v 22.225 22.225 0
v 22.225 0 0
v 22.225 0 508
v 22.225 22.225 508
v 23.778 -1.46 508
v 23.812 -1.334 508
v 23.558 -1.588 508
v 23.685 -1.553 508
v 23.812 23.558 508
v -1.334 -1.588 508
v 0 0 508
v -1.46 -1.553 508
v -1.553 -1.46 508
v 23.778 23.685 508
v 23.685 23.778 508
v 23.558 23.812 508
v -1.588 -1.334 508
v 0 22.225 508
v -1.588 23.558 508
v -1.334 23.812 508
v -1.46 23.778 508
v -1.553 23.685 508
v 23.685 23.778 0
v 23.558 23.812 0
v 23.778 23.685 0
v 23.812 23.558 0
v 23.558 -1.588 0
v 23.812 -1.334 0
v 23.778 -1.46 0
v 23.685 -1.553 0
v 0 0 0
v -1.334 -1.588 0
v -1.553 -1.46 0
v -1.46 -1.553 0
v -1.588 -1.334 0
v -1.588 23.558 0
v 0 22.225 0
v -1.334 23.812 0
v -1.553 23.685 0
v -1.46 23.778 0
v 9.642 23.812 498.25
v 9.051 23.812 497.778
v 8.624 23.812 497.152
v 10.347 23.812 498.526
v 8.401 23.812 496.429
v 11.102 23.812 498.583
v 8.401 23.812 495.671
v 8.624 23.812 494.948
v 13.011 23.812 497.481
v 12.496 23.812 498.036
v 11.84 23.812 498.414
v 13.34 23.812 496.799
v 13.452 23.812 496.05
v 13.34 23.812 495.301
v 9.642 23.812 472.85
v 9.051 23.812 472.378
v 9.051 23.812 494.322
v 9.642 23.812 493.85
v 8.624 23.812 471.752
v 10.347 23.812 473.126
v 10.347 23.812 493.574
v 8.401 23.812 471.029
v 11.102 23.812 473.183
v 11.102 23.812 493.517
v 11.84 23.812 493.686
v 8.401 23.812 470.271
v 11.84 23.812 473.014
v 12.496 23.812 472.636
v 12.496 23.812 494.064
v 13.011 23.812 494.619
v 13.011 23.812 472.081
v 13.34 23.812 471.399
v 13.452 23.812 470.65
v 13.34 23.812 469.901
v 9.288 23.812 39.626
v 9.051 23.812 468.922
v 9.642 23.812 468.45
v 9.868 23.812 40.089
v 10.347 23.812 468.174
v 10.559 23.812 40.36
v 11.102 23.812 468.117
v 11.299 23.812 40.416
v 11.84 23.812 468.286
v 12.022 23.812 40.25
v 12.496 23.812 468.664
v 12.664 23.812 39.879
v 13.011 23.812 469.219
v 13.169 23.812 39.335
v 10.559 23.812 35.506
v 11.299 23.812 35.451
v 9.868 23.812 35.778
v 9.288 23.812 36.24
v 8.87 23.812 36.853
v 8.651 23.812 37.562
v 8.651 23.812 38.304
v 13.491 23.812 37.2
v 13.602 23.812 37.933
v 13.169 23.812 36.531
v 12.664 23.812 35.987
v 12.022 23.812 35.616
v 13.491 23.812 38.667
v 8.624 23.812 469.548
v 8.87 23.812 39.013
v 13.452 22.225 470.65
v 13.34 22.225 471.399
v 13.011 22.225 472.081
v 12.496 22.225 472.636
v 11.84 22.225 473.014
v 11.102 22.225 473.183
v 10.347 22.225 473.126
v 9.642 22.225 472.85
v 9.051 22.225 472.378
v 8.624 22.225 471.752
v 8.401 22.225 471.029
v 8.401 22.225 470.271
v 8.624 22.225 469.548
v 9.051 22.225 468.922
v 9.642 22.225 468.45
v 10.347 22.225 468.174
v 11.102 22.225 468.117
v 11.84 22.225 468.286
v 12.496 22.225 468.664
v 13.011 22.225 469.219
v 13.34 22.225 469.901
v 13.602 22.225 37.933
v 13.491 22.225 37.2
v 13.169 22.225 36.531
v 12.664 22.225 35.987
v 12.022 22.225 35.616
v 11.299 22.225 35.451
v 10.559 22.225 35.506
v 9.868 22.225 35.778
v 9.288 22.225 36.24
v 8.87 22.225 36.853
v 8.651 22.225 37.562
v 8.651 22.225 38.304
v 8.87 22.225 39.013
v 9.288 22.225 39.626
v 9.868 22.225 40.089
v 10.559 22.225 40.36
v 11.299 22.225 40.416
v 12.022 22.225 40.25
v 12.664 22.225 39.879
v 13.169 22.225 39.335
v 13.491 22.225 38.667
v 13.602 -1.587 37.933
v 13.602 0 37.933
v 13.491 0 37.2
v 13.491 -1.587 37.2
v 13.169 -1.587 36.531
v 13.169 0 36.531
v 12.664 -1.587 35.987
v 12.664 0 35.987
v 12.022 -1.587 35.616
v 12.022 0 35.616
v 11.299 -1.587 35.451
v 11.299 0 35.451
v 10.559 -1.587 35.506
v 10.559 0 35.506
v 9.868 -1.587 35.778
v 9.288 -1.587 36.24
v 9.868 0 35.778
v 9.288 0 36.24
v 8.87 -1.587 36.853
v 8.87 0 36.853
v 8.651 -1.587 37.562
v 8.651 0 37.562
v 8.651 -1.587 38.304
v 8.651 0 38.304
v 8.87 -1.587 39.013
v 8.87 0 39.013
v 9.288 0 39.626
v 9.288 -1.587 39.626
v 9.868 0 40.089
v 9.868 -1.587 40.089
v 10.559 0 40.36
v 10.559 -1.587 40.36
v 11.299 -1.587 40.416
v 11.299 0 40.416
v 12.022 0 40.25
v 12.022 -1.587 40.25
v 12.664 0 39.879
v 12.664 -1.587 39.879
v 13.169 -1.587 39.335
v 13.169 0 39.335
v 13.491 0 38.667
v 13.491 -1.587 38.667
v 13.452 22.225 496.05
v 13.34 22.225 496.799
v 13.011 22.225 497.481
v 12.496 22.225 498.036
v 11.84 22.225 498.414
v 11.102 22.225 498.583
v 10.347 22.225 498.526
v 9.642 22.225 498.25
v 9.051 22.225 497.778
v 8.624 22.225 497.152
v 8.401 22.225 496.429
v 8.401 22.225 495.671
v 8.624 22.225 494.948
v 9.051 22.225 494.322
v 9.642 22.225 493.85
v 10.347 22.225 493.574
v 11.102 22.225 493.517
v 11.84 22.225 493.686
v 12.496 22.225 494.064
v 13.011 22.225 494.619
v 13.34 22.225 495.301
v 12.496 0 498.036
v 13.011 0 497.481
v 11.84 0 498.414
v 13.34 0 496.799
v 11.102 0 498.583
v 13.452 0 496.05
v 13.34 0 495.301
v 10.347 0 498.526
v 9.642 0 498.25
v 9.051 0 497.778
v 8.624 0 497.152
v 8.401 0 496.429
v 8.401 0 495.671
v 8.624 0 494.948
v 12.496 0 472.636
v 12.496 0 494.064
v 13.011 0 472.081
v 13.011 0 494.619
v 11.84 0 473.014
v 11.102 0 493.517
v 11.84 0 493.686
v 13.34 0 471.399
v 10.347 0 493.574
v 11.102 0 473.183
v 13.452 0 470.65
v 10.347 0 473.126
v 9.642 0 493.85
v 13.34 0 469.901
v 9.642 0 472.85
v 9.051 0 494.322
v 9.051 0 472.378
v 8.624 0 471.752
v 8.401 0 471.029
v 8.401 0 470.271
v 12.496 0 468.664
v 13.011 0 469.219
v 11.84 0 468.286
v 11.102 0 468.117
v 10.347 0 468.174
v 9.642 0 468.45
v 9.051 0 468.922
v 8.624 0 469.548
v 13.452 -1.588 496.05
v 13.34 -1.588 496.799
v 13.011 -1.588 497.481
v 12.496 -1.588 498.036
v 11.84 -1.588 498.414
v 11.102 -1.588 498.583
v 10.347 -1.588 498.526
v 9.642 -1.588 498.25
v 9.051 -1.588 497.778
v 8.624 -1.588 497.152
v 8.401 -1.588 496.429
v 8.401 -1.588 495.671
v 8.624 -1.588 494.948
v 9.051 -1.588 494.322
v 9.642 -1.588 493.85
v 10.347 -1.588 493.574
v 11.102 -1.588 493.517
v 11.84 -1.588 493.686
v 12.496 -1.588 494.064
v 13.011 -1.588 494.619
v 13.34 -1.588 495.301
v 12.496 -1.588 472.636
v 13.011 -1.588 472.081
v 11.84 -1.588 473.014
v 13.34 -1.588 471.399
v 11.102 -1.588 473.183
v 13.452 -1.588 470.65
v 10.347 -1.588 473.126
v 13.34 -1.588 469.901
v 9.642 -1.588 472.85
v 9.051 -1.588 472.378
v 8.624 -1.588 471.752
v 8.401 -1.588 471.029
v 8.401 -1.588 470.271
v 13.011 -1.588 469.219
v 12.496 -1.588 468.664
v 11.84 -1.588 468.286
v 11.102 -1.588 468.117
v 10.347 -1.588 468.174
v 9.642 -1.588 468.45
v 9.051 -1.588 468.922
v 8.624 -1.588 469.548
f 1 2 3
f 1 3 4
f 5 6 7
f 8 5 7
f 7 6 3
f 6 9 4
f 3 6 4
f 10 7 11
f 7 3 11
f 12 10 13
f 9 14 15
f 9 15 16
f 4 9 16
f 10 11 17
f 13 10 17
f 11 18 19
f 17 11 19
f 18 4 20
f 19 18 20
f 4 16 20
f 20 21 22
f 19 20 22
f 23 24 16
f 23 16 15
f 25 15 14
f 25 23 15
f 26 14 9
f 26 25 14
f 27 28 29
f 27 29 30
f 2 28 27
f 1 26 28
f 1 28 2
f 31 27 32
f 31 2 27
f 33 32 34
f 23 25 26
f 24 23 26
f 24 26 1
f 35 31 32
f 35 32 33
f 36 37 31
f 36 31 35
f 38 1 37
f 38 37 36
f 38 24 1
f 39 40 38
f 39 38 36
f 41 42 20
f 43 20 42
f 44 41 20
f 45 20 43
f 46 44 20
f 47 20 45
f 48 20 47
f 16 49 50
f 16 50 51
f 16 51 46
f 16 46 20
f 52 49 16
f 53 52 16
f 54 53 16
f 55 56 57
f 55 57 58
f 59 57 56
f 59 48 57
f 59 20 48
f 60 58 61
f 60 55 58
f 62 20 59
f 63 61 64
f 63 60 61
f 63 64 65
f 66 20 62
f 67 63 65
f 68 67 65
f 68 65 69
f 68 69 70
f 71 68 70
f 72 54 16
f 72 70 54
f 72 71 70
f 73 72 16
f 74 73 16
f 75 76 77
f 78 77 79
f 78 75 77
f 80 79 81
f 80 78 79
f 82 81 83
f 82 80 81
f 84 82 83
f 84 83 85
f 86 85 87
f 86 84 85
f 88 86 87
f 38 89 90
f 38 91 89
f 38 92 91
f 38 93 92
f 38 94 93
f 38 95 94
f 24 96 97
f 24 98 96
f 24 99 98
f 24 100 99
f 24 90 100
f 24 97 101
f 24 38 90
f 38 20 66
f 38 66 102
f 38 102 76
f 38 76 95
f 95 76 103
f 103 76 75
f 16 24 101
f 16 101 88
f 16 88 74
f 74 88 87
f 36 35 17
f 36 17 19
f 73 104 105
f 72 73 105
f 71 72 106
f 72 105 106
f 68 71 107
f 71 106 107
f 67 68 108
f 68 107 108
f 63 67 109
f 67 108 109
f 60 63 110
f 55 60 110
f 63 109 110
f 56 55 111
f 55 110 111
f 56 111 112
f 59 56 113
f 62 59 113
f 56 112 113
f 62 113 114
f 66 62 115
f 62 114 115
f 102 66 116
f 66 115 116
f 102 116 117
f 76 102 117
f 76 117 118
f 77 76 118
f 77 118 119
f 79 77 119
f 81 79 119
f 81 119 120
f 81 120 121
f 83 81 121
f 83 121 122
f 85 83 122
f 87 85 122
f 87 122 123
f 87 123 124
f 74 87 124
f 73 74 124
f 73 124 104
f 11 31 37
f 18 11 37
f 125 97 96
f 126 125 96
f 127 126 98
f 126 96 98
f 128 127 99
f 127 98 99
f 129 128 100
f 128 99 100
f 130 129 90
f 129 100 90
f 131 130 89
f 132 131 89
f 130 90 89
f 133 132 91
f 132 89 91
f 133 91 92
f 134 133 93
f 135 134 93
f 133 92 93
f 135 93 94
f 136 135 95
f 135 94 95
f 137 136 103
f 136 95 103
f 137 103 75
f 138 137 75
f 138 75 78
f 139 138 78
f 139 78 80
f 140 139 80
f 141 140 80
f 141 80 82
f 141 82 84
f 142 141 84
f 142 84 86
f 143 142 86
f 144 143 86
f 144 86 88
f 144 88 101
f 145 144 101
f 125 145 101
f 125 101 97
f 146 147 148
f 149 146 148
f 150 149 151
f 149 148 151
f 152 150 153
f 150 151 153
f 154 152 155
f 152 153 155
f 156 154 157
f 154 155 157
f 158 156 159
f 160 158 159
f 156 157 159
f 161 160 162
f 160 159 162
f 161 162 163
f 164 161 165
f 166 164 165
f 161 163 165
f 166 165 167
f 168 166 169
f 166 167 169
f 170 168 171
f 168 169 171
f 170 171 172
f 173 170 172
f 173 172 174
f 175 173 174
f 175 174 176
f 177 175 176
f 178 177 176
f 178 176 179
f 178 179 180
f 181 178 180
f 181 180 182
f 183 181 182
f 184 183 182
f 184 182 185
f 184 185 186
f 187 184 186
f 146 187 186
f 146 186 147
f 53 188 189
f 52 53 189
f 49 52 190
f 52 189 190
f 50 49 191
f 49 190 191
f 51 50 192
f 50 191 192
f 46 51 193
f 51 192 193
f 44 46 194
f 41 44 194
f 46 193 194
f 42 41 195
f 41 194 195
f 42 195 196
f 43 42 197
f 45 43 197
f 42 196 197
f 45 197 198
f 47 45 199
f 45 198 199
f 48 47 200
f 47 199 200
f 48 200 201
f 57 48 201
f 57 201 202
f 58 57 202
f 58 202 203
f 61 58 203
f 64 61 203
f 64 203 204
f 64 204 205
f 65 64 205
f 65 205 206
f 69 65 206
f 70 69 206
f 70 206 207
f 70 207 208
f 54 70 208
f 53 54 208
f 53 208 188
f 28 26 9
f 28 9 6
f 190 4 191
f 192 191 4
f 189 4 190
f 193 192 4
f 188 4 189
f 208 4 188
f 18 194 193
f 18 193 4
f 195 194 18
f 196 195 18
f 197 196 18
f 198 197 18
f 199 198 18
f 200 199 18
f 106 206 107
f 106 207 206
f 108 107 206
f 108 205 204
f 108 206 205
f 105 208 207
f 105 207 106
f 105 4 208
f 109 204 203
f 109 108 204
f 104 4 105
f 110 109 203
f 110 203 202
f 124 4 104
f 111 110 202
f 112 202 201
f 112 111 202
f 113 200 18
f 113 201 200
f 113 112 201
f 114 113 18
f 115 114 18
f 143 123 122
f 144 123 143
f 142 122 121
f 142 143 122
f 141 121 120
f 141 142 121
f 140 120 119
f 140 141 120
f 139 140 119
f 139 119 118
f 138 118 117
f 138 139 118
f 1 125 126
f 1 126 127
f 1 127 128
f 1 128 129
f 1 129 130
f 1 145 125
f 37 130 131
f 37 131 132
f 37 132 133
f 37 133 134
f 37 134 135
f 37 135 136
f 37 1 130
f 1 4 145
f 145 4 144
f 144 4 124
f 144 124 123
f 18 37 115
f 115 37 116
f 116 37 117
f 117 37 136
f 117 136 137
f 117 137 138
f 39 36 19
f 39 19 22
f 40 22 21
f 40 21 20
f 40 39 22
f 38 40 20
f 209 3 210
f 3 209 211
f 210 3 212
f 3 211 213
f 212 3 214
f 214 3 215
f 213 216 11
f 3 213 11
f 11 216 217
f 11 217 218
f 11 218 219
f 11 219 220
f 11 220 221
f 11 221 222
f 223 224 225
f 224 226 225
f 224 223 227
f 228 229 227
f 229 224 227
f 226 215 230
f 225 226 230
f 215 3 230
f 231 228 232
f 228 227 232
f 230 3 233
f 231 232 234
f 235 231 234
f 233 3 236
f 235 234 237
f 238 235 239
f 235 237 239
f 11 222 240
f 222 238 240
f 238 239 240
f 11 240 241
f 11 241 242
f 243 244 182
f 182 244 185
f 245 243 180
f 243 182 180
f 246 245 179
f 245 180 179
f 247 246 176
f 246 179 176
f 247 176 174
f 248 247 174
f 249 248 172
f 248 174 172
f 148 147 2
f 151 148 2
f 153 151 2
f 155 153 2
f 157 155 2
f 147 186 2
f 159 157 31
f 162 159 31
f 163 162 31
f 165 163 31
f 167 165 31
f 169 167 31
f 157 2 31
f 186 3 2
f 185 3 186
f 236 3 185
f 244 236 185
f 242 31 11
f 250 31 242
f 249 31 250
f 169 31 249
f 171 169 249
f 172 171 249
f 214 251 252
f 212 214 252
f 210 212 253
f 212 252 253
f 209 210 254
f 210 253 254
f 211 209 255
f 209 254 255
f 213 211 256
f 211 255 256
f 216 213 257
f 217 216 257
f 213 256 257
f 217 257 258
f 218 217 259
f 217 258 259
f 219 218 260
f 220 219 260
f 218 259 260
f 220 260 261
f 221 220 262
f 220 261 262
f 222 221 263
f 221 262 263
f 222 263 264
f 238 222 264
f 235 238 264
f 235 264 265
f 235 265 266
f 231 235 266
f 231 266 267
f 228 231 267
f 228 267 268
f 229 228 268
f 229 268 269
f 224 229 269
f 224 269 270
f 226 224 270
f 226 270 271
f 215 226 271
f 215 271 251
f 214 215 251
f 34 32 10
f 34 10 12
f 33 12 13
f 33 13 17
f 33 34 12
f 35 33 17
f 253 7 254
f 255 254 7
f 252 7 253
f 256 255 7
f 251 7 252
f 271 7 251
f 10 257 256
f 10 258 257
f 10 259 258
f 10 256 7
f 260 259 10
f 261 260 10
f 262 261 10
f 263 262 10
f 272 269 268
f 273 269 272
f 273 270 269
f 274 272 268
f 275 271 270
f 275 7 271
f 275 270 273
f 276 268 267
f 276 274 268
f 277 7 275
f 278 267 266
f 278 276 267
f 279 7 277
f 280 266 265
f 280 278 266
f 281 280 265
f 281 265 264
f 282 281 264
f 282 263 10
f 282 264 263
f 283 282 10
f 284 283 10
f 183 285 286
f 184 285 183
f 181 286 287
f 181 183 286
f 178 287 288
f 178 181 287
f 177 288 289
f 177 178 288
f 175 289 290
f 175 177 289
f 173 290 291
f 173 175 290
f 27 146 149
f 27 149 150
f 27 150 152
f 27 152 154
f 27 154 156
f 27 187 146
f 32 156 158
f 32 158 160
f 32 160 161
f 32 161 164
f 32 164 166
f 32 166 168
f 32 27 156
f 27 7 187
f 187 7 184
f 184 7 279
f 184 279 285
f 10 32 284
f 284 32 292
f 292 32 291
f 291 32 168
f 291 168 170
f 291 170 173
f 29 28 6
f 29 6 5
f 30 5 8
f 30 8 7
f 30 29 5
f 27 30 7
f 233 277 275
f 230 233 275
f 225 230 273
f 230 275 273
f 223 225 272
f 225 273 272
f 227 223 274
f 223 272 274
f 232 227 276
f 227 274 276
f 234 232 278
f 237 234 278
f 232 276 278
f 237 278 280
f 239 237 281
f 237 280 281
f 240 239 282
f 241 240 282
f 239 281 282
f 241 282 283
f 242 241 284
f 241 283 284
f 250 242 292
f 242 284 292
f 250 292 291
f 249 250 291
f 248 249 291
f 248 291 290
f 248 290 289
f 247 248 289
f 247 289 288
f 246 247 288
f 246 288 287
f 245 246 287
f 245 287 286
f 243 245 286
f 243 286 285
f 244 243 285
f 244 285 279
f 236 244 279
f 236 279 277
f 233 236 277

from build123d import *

# Parameters (mm, degrees)
SKETCH1_W           = 22.225
SKETCH1_H           = 22.225
BOSS_EXTRUDE1_DEPTH = 508
SKETCH7_R           = 2.54
CUT_EXTRUDE5_DEPTH  = 26.4
SKETCH8_R           = 2.4892
CUT_EXTRUDE6_DEPTH  = 25.4


with BuildPart() as part:
    # Sketch1 → Boss-Extrude1 (new body)
    with BuildSketch(Plane(origin=(0, 0, 0), x_dir=(-1, 0, 0), z_dir=(0, 0, -1))):
        with BuildLine():
            Line((1.5875, -1.3335), (1.5875, 23.5585))
            ThreePointArc((1.5875, 23.5585), (1.513105122, 23.738105122), (1.3335, 23.8125))
            Line((1.3335, 23.8125), (-23.5585, 23.8125))
            ThreePointArc((-23.5585, 23.8125), (-23.738105122, 23.738105122), (-23.8125, 23.5585))
            Line((-23.8125, 23.5585), (-23.8125, -1.3335))
            ThreePointArc((-23.8125, -1.3335), (-23.738105122, -1.513105122), (-23.5585, -1.5875))
            Line((-23.5585, -1.5875), (1.3335, -1.5875))
            ThreePointArc((1.3335, -1.5875), (1.513105122, -1.513105122), (1.5875, -1.3335))
        make_face()
        with Locations((-11.1125, 11.1125)):
            Rectangle(SKETCH1_W, SKETCH1_H, mode=Mode.SUBTRACT)
    extrude(amount=-BOSS_EXTRUDE1_DEPTH)

    # Sketch7 → Cut-Extrude5 (cut, through all)
    with BuildSketch(Plane.XZ.offset(1.5875)):
        with Locations((10.9125, 470.65)):
            Circle(SKETCH7_R)
        with Locations((10.9125, 496.05)):
            Circle(SKETCH7_R)
    extrude(amount=-CUT_EXTRUDE5_DEPTH, mode=Mode.SUBTRACT)

    # Sketch8 → Cut-Extrude6 (cut)
    with BuildSketch(Plane(origin=(0, 23.8125, 0), x_dir=(1, 0, 0), z_dir=(0, 1, 0))):
        with Locations((11.1125, -37.933268304)):
            Circle(SKETCH8_R)
    extrude(amount=-CUT_EXTRUDE6_DEPTH, mode=Mode.SUBTRACT)


solid = part.part
